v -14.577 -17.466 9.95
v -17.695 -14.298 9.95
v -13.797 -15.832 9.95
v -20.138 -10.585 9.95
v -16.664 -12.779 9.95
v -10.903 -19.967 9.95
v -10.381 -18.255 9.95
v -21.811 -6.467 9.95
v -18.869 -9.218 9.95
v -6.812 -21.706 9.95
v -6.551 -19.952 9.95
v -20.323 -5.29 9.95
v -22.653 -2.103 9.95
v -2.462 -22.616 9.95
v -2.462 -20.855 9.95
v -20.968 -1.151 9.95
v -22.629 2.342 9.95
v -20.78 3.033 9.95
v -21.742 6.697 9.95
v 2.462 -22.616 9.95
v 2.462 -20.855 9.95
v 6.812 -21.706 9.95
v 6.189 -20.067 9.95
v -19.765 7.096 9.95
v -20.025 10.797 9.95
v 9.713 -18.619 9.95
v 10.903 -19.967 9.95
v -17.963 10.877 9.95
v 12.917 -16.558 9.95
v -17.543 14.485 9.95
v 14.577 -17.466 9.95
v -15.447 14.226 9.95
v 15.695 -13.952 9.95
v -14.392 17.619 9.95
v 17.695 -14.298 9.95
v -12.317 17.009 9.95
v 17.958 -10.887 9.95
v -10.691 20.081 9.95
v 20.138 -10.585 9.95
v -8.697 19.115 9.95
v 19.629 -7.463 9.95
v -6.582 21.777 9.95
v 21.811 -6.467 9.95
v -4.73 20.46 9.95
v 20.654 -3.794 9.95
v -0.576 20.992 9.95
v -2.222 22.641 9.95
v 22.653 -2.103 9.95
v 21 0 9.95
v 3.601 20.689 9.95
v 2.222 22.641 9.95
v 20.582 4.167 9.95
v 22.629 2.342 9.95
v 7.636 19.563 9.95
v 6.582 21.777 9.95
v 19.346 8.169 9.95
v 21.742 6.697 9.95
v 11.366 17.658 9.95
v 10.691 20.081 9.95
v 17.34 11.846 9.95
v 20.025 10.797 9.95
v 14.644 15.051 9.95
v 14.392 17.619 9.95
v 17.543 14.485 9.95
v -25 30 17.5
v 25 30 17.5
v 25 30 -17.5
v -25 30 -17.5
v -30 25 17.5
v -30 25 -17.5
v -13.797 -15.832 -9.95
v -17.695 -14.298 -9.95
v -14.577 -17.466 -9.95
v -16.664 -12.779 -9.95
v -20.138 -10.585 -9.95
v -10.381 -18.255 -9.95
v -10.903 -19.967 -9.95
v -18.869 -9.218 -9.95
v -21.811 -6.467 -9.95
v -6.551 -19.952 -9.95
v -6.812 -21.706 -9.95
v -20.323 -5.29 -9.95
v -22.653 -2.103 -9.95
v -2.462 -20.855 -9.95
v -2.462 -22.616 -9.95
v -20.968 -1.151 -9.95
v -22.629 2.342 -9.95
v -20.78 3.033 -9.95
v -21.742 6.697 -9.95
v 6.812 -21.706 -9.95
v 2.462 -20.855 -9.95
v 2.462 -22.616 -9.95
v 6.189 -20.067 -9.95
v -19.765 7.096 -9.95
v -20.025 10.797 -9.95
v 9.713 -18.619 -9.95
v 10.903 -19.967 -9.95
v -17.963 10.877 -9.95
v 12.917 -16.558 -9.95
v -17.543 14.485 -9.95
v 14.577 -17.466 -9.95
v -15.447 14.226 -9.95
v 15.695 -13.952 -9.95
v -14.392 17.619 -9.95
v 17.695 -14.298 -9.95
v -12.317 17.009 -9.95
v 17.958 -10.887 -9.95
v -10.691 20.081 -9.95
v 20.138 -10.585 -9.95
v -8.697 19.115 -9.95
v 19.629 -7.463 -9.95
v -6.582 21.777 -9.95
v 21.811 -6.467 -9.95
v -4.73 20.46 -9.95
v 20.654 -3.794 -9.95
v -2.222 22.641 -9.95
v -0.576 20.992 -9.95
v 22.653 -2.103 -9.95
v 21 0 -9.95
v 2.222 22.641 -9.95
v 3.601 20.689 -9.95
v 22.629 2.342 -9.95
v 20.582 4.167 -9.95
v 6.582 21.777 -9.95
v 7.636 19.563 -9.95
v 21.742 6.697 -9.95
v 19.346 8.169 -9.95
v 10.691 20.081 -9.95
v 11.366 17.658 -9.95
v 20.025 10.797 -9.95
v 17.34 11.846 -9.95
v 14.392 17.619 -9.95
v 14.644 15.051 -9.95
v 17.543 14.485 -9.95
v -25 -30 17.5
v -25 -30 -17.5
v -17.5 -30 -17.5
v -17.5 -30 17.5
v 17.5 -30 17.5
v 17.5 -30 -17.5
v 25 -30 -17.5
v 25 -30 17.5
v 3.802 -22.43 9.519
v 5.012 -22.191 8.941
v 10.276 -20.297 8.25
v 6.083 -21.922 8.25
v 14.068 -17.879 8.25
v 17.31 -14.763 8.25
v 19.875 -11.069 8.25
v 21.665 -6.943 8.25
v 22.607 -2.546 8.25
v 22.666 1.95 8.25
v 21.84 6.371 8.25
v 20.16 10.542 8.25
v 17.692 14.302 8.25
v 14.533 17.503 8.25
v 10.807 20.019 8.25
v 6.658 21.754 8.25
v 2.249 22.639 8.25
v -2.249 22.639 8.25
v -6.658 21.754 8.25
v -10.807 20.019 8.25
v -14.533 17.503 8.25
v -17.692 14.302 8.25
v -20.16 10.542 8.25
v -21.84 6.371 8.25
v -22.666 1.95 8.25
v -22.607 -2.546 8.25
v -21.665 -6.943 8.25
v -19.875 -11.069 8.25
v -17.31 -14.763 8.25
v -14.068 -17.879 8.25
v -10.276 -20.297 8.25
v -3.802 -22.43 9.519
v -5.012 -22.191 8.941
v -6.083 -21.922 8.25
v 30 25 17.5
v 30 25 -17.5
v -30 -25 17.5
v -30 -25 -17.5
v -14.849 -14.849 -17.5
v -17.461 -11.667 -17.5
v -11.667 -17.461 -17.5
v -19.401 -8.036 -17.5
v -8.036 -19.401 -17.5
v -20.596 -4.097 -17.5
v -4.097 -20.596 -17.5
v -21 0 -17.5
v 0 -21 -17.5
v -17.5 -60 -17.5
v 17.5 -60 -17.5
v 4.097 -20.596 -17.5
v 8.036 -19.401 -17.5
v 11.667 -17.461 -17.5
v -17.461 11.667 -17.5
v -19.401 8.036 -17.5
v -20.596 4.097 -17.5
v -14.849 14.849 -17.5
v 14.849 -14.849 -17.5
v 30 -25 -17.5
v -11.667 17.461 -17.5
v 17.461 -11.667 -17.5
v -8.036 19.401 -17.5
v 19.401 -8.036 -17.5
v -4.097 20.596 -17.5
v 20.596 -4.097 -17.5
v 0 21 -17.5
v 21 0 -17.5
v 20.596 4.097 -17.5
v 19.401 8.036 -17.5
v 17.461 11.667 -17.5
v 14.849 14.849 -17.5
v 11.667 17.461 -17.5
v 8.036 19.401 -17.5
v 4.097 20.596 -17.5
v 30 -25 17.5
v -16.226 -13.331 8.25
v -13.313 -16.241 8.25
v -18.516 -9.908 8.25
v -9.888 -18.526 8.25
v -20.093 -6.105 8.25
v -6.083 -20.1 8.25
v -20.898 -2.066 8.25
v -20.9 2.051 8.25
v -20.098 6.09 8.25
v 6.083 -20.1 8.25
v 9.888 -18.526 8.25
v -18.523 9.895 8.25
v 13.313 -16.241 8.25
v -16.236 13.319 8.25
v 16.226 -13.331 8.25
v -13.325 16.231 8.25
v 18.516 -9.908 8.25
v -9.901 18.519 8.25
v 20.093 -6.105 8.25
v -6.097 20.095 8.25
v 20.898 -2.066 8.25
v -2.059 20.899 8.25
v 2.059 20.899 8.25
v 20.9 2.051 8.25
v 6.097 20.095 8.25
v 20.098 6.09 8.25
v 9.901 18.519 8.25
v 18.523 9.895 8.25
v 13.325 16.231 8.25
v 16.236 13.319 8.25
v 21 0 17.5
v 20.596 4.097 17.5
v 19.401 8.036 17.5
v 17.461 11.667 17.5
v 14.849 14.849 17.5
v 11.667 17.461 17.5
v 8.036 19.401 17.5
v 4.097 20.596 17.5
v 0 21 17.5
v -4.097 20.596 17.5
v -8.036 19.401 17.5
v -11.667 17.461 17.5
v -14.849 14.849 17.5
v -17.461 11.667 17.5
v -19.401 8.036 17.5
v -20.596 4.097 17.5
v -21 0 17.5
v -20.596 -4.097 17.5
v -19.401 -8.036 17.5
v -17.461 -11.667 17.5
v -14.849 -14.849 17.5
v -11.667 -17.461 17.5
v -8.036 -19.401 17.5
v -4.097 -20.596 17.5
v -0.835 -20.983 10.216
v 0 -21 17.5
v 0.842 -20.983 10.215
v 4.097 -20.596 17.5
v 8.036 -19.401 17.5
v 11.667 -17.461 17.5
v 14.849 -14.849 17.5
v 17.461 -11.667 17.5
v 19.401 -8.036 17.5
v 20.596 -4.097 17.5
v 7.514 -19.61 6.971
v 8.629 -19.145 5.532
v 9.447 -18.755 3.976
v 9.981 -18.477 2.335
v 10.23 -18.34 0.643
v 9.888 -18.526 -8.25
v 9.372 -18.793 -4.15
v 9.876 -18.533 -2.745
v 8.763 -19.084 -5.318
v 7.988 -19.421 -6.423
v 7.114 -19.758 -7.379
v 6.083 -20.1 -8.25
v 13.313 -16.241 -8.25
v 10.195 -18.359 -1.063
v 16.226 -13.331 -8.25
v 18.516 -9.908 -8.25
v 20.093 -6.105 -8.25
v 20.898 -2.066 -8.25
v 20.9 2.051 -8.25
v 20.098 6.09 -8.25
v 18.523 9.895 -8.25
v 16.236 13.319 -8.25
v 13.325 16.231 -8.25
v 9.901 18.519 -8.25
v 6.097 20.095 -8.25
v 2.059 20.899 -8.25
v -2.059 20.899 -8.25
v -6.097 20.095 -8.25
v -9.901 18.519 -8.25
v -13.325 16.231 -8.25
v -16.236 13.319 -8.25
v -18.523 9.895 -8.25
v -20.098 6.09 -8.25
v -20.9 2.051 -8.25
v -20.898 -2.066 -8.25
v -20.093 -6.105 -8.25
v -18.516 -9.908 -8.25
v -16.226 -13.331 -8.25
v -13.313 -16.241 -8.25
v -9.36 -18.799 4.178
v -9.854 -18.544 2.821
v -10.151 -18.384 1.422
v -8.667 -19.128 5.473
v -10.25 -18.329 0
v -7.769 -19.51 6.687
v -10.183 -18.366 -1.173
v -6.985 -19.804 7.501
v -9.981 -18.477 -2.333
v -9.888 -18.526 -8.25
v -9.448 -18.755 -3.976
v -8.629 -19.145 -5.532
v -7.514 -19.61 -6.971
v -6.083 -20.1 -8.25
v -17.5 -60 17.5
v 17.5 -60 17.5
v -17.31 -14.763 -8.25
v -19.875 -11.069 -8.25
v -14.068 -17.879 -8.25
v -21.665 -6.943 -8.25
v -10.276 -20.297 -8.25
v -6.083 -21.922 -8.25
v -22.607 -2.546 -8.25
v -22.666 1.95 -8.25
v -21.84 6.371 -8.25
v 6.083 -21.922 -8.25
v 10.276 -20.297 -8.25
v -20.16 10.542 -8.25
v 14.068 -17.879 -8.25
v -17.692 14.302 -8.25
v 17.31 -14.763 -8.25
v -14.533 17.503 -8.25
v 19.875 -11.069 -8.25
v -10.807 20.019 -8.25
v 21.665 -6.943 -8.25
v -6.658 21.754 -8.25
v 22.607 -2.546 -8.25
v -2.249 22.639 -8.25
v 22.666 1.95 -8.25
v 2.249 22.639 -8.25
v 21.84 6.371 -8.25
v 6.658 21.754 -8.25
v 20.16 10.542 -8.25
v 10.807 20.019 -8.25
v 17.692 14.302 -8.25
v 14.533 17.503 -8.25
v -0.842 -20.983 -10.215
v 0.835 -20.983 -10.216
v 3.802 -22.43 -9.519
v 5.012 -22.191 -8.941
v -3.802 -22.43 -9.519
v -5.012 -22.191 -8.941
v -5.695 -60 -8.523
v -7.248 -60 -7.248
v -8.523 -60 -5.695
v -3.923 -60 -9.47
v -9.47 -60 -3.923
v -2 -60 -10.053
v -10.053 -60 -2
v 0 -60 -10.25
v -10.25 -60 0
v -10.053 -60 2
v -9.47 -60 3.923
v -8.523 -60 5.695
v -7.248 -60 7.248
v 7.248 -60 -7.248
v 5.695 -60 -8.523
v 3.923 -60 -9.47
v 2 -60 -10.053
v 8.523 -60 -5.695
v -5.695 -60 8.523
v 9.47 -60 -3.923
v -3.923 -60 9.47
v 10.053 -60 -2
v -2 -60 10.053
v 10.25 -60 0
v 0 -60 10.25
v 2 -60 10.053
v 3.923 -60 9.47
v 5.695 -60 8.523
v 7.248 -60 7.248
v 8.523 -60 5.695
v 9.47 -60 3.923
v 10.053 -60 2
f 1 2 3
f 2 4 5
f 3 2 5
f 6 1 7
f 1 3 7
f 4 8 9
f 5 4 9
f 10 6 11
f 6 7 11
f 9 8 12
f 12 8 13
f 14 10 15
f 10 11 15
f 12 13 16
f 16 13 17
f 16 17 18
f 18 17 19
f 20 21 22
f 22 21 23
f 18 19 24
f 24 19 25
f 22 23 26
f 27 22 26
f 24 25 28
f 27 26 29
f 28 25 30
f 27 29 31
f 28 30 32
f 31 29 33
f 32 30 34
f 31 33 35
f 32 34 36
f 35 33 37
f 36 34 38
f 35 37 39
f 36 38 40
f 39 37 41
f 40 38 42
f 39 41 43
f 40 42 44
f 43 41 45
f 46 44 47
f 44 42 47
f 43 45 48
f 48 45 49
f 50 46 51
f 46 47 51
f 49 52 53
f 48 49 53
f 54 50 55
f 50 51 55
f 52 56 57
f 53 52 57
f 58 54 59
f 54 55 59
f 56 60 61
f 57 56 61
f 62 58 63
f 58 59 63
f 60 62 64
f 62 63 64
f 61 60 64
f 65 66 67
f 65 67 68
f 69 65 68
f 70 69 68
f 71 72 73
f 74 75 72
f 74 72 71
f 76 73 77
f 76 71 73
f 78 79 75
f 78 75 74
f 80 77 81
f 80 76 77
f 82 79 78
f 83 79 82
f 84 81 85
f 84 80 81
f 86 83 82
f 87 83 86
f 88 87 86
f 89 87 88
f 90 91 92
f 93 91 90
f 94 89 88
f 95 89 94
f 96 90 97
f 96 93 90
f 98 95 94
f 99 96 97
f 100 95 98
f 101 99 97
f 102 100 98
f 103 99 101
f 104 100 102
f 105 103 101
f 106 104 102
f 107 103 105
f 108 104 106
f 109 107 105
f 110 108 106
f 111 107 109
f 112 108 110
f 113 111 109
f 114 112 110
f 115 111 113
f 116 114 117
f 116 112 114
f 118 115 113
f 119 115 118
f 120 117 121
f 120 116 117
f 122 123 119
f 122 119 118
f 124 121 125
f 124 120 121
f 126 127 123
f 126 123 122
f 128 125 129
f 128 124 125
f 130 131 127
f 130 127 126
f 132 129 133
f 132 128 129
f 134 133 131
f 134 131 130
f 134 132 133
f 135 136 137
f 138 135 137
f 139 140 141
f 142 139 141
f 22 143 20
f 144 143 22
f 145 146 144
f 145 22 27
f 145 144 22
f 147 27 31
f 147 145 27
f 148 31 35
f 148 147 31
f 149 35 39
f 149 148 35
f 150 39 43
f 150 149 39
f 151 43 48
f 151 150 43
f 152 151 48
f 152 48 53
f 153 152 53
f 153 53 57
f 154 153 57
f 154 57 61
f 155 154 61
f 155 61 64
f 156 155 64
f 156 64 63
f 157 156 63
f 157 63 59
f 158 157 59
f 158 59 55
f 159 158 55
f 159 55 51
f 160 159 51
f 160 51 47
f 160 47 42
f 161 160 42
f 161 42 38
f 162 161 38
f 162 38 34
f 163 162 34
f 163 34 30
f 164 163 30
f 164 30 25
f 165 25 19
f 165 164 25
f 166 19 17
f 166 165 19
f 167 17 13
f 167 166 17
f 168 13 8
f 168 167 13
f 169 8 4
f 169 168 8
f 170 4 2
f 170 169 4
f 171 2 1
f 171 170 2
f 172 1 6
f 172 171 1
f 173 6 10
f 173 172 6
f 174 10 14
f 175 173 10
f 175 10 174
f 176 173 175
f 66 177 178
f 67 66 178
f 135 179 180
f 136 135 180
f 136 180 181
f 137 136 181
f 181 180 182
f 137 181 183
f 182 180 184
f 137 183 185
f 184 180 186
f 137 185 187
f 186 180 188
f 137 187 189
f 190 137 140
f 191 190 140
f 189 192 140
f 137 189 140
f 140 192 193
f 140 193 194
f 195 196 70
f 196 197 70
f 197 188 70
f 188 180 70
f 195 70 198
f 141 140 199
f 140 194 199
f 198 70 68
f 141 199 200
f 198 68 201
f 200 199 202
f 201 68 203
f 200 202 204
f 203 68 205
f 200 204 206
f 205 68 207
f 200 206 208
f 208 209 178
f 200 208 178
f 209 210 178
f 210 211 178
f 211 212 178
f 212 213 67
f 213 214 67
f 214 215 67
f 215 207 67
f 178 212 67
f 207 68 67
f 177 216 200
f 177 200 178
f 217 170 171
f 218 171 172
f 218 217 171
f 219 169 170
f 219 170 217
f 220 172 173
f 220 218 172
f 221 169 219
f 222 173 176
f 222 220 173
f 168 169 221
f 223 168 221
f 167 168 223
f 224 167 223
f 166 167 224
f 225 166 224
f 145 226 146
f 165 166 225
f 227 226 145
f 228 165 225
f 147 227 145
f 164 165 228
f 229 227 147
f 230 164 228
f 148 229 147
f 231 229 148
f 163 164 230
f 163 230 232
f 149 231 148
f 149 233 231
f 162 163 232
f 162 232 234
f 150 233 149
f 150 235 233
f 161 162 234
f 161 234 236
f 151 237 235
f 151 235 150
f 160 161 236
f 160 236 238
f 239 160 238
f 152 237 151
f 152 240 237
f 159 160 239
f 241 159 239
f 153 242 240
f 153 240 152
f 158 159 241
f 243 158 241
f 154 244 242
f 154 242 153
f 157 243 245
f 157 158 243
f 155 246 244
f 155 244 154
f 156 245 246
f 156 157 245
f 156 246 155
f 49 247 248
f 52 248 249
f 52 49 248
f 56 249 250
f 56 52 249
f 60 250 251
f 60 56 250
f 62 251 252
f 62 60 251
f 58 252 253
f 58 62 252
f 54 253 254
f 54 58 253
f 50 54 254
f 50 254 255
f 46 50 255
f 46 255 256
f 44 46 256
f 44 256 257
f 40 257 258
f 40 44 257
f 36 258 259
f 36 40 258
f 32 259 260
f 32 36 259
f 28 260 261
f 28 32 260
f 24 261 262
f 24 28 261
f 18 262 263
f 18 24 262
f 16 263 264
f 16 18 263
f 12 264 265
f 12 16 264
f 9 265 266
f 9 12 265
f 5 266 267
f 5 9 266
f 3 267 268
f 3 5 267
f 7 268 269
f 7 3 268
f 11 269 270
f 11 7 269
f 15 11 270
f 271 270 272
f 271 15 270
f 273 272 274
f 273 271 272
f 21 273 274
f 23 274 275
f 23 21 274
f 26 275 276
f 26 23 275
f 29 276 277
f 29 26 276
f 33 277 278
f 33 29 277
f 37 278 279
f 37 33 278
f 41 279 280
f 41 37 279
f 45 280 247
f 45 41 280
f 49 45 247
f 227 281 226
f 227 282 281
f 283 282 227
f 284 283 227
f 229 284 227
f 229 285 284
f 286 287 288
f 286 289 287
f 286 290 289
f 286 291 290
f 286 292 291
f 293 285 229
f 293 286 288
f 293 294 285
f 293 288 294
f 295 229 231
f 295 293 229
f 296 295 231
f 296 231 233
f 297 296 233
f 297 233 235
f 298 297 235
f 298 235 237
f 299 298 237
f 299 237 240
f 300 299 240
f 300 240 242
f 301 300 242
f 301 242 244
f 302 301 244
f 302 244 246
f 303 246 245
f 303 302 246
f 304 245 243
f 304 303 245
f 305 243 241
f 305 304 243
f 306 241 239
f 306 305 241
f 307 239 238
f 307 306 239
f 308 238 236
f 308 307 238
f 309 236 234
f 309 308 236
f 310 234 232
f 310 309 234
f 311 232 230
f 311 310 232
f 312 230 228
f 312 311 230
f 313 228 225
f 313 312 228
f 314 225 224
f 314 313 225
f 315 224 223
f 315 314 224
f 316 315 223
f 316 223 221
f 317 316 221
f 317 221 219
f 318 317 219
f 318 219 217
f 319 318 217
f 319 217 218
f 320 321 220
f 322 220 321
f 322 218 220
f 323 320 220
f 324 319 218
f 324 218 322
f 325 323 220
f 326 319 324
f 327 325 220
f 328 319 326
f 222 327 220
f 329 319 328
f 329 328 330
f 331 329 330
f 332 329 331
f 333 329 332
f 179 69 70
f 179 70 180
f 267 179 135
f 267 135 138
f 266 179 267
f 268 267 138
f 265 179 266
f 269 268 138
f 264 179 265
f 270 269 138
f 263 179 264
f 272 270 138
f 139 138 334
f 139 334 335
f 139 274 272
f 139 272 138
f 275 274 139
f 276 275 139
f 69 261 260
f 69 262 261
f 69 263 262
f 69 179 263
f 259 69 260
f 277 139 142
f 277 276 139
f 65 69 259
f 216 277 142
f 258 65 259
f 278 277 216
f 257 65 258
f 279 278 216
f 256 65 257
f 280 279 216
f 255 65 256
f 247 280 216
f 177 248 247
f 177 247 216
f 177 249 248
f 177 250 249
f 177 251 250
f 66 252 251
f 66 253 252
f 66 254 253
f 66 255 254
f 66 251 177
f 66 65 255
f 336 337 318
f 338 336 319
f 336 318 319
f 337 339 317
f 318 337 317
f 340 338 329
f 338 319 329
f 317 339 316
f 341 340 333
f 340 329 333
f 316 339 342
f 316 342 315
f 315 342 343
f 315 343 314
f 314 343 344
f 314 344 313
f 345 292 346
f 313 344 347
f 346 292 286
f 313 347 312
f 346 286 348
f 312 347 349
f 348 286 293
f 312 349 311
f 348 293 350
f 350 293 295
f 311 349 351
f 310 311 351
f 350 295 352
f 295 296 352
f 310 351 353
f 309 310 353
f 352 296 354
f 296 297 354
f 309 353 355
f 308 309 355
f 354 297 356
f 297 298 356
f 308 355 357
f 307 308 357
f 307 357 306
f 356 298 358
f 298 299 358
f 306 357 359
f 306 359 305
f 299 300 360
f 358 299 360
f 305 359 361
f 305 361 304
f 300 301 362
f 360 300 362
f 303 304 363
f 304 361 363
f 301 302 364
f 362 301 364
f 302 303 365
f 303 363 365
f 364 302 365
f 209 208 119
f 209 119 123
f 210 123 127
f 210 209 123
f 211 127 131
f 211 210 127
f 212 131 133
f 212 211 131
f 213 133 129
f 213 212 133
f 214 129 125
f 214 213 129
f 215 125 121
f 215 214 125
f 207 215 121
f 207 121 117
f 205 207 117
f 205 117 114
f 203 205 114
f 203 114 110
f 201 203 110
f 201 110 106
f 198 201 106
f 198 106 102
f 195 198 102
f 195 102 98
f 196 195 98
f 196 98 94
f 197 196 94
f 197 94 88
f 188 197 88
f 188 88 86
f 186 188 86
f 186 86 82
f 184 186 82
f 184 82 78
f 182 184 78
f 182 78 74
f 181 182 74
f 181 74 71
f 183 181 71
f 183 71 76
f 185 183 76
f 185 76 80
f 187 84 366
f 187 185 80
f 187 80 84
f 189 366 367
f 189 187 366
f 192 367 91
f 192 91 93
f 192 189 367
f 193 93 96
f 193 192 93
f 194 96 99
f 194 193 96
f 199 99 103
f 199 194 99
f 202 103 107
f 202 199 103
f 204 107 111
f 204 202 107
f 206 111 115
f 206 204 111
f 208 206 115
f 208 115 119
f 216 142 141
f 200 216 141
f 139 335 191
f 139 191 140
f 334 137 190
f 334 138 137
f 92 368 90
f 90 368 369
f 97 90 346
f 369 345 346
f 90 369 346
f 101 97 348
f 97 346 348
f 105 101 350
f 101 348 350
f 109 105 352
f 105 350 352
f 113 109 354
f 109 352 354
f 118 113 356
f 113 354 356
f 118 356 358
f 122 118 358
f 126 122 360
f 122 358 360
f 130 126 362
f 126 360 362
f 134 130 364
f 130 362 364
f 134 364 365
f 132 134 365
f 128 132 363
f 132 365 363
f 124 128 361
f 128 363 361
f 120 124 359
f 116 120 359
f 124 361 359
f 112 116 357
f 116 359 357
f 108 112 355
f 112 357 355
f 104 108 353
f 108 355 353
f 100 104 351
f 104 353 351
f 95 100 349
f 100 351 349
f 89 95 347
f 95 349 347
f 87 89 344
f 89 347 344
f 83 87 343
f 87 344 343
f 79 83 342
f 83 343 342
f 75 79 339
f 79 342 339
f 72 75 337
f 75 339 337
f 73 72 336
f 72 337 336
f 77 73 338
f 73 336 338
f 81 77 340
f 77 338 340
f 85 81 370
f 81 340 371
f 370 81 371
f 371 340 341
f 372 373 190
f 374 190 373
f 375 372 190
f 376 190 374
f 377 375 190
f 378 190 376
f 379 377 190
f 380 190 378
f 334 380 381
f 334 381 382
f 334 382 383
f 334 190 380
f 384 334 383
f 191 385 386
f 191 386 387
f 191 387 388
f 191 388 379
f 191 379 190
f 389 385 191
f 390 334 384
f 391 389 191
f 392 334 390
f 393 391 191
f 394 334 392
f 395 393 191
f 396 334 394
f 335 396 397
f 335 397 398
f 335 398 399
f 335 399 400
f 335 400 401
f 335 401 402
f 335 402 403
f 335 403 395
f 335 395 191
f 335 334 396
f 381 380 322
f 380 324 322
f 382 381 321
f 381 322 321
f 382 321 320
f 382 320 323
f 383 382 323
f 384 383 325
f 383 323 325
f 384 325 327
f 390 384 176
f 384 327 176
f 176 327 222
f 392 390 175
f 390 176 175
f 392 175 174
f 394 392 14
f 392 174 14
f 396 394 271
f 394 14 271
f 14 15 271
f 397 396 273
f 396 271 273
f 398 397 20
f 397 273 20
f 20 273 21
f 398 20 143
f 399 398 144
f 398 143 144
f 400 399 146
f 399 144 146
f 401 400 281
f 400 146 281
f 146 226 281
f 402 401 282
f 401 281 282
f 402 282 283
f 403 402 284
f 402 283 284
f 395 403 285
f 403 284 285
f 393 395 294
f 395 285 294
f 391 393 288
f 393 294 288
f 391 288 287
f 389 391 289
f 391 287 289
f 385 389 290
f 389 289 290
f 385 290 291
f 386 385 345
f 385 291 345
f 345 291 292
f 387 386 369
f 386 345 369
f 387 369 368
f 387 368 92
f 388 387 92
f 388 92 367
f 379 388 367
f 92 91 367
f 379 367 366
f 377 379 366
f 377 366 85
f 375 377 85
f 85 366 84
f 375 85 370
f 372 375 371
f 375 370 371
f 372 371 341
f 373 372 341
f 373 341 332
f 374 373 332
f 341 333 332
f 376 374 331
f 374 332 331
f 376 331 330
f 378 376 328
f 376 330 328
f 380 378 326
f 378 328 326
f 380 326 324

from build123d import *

# Parameters (mm, degrees)
SKETCH_1_R          = 30
SKETCH_1_R_2        = 21
EXTRUDE_1_DEPTH     = 17.5
M22X1_5_1_D         = 20.5
M22X1_5_1_DEPTH     = 48.5
M22X1_5_1_TIP       = 6.158821345
CUT_EXTRUDE_START   = 8.25
SKETCH_5_R          = 22.75
SKETCH_5_R_2        = 21
CUT_EXTRUDE_1_DEPTH = 1.7
CHAMFER_1_SIZE      = 5


with BuildPart() as part:
    # 草图1 → 凸台-拉伸1 (new, symmetric)
    # profile 1 of 8: a face of its own
    with BuildSketch(Plane.XY):
        with BuildLine():
            Line((30, 30), (2.9e-08, 30))
            ThreePointArc((2.9e-08, 30), (21.213203446, 21.213203425), (30, 0))
            Line((30, 0), (30, 30))
        make_face()
    # profile 2 of 8: a face of its own
    with BuildSketch(Plane.XY):
        with BuildLine():
            Line((-30, 30), (-30, 0))
            ThreePointArc((-30, 0), (-21.213203425, 21.213203446), (2.9e-08, 30))
            Line((2.9e-08, 30), (-30, 30))
        make_face()
    # profile 3 of 8: a face of its own
    with BuildSketch(Plane.XY):
        Circle(SKETCH_1_R)
        Circle(SKETCH_1_R_2, mode=Mode.SUBTRACT)
    # profile 4 of 8: a face of its own
    with BuildSketch(Plane.XY):
        with BuildLine():
            Line((17.5, -24.366985862), (17.5, -30))
            Line((17.5, -30), (30, -30))
            Line((30, -30), (30, 0))
            ThreePointArc((30, 0), (26.69269563, -13.693063938), (17.5, -24.366985862))
        make_face()
    # profile 5 of 8: a face of its own
    with BuildSketch(Plane.XY):
        with BuildLine():
            ThreePointArc((17.5, -24.366985862), (9.192127723, -28.557044454), (0, -30))
            Line((0, -30), (17.5, -30))
            Line((17.5, -30), (17.5, -24.366985862))
        make_face()
    # profile 6 of 8: a face of its own
    with BuildSketch(Plane.XY):
        with BuildLine():
            ThreePointArc((0, -30), (-9.192127723, -28.557044454), (-17.5, -24.366985862))
            Line((-17.5, -24.366985862), (-17.5, -30))
            Line((-17.5, -30), (0, -30))
        make_face()
    # profile 7 of 8: a face of its own
    with BuildSketch(Plane.XY):
        with BuildLine():
            Line((-17.5, -30), (-17.5, -24.366985862))
            ThreePointArc((-17.5, -24.366985862), (-26.69269563, -13.693063938), (-30, 0))
            Line((-30, 0), (-30, -30))
            Line((-30, -30), (-17.5, -30))
        make_face()
    # profile 8 of 8: a face of its own
    with BuildSketch(Plane.XY):
        Polygon((0, -30), (-17.5, -30), (-17.5, -60), (17.5, -60), (17.5, -30), align=None)
    extrude(amount=EXTRUDE_1_DEPTH, both=True)

    # M22x1.5 螺纹孔1
    with Locations(Plane.XZ.offset(60)):
        with Locations((0, 0)):
            Hole(M22X1_5_1_D / 2, depth=M22X1_5_1_DEPTH)
            with Locations((0, 0, -(M22X1_5_1_DEPTH + M22X1_5_1_TIP / 2))):  # 118° drill point
                Cone(0, M22X1_5_1_D / 2, M22X1_5_1_TIP, mode=Mode.SUBTRACT)

    # 草图5 → 切除-拉伸1 (cut)
    with BuildSketch(Plane.XY.offset(CUT_EXTRUDE_START)):
        Circle(SKETCH_5_R)
        with Locations(Location((0, 0, 0), (0, 0, 253.16267609))):
            Circle(SKETCH_5_R_2, mode=Mode.SUBTRACT)
    cut_extrude_1 = extrude(amount=CUT_EXTRUDE_1_DEPTH, mode=Mode.SUBTRACT)

    # 镜向1: 切除-拉伸1 across plane
    add(cut_extrude_1.mirror(Plane.XY), mode=Mode.SUBTRACT)

    # 倒角1
    chamfer_1_edges = [part.edges().sort_by_distance(p)[0] for p in [
        (-30, -30, 0),
        (-30, 30, 0),
        (30, 30, 0),
        (30, -30, 0),
    ]]
    chamfer(chamfer_1_edges, length=CHAMFER_1_SIZE)


solid = part.part
